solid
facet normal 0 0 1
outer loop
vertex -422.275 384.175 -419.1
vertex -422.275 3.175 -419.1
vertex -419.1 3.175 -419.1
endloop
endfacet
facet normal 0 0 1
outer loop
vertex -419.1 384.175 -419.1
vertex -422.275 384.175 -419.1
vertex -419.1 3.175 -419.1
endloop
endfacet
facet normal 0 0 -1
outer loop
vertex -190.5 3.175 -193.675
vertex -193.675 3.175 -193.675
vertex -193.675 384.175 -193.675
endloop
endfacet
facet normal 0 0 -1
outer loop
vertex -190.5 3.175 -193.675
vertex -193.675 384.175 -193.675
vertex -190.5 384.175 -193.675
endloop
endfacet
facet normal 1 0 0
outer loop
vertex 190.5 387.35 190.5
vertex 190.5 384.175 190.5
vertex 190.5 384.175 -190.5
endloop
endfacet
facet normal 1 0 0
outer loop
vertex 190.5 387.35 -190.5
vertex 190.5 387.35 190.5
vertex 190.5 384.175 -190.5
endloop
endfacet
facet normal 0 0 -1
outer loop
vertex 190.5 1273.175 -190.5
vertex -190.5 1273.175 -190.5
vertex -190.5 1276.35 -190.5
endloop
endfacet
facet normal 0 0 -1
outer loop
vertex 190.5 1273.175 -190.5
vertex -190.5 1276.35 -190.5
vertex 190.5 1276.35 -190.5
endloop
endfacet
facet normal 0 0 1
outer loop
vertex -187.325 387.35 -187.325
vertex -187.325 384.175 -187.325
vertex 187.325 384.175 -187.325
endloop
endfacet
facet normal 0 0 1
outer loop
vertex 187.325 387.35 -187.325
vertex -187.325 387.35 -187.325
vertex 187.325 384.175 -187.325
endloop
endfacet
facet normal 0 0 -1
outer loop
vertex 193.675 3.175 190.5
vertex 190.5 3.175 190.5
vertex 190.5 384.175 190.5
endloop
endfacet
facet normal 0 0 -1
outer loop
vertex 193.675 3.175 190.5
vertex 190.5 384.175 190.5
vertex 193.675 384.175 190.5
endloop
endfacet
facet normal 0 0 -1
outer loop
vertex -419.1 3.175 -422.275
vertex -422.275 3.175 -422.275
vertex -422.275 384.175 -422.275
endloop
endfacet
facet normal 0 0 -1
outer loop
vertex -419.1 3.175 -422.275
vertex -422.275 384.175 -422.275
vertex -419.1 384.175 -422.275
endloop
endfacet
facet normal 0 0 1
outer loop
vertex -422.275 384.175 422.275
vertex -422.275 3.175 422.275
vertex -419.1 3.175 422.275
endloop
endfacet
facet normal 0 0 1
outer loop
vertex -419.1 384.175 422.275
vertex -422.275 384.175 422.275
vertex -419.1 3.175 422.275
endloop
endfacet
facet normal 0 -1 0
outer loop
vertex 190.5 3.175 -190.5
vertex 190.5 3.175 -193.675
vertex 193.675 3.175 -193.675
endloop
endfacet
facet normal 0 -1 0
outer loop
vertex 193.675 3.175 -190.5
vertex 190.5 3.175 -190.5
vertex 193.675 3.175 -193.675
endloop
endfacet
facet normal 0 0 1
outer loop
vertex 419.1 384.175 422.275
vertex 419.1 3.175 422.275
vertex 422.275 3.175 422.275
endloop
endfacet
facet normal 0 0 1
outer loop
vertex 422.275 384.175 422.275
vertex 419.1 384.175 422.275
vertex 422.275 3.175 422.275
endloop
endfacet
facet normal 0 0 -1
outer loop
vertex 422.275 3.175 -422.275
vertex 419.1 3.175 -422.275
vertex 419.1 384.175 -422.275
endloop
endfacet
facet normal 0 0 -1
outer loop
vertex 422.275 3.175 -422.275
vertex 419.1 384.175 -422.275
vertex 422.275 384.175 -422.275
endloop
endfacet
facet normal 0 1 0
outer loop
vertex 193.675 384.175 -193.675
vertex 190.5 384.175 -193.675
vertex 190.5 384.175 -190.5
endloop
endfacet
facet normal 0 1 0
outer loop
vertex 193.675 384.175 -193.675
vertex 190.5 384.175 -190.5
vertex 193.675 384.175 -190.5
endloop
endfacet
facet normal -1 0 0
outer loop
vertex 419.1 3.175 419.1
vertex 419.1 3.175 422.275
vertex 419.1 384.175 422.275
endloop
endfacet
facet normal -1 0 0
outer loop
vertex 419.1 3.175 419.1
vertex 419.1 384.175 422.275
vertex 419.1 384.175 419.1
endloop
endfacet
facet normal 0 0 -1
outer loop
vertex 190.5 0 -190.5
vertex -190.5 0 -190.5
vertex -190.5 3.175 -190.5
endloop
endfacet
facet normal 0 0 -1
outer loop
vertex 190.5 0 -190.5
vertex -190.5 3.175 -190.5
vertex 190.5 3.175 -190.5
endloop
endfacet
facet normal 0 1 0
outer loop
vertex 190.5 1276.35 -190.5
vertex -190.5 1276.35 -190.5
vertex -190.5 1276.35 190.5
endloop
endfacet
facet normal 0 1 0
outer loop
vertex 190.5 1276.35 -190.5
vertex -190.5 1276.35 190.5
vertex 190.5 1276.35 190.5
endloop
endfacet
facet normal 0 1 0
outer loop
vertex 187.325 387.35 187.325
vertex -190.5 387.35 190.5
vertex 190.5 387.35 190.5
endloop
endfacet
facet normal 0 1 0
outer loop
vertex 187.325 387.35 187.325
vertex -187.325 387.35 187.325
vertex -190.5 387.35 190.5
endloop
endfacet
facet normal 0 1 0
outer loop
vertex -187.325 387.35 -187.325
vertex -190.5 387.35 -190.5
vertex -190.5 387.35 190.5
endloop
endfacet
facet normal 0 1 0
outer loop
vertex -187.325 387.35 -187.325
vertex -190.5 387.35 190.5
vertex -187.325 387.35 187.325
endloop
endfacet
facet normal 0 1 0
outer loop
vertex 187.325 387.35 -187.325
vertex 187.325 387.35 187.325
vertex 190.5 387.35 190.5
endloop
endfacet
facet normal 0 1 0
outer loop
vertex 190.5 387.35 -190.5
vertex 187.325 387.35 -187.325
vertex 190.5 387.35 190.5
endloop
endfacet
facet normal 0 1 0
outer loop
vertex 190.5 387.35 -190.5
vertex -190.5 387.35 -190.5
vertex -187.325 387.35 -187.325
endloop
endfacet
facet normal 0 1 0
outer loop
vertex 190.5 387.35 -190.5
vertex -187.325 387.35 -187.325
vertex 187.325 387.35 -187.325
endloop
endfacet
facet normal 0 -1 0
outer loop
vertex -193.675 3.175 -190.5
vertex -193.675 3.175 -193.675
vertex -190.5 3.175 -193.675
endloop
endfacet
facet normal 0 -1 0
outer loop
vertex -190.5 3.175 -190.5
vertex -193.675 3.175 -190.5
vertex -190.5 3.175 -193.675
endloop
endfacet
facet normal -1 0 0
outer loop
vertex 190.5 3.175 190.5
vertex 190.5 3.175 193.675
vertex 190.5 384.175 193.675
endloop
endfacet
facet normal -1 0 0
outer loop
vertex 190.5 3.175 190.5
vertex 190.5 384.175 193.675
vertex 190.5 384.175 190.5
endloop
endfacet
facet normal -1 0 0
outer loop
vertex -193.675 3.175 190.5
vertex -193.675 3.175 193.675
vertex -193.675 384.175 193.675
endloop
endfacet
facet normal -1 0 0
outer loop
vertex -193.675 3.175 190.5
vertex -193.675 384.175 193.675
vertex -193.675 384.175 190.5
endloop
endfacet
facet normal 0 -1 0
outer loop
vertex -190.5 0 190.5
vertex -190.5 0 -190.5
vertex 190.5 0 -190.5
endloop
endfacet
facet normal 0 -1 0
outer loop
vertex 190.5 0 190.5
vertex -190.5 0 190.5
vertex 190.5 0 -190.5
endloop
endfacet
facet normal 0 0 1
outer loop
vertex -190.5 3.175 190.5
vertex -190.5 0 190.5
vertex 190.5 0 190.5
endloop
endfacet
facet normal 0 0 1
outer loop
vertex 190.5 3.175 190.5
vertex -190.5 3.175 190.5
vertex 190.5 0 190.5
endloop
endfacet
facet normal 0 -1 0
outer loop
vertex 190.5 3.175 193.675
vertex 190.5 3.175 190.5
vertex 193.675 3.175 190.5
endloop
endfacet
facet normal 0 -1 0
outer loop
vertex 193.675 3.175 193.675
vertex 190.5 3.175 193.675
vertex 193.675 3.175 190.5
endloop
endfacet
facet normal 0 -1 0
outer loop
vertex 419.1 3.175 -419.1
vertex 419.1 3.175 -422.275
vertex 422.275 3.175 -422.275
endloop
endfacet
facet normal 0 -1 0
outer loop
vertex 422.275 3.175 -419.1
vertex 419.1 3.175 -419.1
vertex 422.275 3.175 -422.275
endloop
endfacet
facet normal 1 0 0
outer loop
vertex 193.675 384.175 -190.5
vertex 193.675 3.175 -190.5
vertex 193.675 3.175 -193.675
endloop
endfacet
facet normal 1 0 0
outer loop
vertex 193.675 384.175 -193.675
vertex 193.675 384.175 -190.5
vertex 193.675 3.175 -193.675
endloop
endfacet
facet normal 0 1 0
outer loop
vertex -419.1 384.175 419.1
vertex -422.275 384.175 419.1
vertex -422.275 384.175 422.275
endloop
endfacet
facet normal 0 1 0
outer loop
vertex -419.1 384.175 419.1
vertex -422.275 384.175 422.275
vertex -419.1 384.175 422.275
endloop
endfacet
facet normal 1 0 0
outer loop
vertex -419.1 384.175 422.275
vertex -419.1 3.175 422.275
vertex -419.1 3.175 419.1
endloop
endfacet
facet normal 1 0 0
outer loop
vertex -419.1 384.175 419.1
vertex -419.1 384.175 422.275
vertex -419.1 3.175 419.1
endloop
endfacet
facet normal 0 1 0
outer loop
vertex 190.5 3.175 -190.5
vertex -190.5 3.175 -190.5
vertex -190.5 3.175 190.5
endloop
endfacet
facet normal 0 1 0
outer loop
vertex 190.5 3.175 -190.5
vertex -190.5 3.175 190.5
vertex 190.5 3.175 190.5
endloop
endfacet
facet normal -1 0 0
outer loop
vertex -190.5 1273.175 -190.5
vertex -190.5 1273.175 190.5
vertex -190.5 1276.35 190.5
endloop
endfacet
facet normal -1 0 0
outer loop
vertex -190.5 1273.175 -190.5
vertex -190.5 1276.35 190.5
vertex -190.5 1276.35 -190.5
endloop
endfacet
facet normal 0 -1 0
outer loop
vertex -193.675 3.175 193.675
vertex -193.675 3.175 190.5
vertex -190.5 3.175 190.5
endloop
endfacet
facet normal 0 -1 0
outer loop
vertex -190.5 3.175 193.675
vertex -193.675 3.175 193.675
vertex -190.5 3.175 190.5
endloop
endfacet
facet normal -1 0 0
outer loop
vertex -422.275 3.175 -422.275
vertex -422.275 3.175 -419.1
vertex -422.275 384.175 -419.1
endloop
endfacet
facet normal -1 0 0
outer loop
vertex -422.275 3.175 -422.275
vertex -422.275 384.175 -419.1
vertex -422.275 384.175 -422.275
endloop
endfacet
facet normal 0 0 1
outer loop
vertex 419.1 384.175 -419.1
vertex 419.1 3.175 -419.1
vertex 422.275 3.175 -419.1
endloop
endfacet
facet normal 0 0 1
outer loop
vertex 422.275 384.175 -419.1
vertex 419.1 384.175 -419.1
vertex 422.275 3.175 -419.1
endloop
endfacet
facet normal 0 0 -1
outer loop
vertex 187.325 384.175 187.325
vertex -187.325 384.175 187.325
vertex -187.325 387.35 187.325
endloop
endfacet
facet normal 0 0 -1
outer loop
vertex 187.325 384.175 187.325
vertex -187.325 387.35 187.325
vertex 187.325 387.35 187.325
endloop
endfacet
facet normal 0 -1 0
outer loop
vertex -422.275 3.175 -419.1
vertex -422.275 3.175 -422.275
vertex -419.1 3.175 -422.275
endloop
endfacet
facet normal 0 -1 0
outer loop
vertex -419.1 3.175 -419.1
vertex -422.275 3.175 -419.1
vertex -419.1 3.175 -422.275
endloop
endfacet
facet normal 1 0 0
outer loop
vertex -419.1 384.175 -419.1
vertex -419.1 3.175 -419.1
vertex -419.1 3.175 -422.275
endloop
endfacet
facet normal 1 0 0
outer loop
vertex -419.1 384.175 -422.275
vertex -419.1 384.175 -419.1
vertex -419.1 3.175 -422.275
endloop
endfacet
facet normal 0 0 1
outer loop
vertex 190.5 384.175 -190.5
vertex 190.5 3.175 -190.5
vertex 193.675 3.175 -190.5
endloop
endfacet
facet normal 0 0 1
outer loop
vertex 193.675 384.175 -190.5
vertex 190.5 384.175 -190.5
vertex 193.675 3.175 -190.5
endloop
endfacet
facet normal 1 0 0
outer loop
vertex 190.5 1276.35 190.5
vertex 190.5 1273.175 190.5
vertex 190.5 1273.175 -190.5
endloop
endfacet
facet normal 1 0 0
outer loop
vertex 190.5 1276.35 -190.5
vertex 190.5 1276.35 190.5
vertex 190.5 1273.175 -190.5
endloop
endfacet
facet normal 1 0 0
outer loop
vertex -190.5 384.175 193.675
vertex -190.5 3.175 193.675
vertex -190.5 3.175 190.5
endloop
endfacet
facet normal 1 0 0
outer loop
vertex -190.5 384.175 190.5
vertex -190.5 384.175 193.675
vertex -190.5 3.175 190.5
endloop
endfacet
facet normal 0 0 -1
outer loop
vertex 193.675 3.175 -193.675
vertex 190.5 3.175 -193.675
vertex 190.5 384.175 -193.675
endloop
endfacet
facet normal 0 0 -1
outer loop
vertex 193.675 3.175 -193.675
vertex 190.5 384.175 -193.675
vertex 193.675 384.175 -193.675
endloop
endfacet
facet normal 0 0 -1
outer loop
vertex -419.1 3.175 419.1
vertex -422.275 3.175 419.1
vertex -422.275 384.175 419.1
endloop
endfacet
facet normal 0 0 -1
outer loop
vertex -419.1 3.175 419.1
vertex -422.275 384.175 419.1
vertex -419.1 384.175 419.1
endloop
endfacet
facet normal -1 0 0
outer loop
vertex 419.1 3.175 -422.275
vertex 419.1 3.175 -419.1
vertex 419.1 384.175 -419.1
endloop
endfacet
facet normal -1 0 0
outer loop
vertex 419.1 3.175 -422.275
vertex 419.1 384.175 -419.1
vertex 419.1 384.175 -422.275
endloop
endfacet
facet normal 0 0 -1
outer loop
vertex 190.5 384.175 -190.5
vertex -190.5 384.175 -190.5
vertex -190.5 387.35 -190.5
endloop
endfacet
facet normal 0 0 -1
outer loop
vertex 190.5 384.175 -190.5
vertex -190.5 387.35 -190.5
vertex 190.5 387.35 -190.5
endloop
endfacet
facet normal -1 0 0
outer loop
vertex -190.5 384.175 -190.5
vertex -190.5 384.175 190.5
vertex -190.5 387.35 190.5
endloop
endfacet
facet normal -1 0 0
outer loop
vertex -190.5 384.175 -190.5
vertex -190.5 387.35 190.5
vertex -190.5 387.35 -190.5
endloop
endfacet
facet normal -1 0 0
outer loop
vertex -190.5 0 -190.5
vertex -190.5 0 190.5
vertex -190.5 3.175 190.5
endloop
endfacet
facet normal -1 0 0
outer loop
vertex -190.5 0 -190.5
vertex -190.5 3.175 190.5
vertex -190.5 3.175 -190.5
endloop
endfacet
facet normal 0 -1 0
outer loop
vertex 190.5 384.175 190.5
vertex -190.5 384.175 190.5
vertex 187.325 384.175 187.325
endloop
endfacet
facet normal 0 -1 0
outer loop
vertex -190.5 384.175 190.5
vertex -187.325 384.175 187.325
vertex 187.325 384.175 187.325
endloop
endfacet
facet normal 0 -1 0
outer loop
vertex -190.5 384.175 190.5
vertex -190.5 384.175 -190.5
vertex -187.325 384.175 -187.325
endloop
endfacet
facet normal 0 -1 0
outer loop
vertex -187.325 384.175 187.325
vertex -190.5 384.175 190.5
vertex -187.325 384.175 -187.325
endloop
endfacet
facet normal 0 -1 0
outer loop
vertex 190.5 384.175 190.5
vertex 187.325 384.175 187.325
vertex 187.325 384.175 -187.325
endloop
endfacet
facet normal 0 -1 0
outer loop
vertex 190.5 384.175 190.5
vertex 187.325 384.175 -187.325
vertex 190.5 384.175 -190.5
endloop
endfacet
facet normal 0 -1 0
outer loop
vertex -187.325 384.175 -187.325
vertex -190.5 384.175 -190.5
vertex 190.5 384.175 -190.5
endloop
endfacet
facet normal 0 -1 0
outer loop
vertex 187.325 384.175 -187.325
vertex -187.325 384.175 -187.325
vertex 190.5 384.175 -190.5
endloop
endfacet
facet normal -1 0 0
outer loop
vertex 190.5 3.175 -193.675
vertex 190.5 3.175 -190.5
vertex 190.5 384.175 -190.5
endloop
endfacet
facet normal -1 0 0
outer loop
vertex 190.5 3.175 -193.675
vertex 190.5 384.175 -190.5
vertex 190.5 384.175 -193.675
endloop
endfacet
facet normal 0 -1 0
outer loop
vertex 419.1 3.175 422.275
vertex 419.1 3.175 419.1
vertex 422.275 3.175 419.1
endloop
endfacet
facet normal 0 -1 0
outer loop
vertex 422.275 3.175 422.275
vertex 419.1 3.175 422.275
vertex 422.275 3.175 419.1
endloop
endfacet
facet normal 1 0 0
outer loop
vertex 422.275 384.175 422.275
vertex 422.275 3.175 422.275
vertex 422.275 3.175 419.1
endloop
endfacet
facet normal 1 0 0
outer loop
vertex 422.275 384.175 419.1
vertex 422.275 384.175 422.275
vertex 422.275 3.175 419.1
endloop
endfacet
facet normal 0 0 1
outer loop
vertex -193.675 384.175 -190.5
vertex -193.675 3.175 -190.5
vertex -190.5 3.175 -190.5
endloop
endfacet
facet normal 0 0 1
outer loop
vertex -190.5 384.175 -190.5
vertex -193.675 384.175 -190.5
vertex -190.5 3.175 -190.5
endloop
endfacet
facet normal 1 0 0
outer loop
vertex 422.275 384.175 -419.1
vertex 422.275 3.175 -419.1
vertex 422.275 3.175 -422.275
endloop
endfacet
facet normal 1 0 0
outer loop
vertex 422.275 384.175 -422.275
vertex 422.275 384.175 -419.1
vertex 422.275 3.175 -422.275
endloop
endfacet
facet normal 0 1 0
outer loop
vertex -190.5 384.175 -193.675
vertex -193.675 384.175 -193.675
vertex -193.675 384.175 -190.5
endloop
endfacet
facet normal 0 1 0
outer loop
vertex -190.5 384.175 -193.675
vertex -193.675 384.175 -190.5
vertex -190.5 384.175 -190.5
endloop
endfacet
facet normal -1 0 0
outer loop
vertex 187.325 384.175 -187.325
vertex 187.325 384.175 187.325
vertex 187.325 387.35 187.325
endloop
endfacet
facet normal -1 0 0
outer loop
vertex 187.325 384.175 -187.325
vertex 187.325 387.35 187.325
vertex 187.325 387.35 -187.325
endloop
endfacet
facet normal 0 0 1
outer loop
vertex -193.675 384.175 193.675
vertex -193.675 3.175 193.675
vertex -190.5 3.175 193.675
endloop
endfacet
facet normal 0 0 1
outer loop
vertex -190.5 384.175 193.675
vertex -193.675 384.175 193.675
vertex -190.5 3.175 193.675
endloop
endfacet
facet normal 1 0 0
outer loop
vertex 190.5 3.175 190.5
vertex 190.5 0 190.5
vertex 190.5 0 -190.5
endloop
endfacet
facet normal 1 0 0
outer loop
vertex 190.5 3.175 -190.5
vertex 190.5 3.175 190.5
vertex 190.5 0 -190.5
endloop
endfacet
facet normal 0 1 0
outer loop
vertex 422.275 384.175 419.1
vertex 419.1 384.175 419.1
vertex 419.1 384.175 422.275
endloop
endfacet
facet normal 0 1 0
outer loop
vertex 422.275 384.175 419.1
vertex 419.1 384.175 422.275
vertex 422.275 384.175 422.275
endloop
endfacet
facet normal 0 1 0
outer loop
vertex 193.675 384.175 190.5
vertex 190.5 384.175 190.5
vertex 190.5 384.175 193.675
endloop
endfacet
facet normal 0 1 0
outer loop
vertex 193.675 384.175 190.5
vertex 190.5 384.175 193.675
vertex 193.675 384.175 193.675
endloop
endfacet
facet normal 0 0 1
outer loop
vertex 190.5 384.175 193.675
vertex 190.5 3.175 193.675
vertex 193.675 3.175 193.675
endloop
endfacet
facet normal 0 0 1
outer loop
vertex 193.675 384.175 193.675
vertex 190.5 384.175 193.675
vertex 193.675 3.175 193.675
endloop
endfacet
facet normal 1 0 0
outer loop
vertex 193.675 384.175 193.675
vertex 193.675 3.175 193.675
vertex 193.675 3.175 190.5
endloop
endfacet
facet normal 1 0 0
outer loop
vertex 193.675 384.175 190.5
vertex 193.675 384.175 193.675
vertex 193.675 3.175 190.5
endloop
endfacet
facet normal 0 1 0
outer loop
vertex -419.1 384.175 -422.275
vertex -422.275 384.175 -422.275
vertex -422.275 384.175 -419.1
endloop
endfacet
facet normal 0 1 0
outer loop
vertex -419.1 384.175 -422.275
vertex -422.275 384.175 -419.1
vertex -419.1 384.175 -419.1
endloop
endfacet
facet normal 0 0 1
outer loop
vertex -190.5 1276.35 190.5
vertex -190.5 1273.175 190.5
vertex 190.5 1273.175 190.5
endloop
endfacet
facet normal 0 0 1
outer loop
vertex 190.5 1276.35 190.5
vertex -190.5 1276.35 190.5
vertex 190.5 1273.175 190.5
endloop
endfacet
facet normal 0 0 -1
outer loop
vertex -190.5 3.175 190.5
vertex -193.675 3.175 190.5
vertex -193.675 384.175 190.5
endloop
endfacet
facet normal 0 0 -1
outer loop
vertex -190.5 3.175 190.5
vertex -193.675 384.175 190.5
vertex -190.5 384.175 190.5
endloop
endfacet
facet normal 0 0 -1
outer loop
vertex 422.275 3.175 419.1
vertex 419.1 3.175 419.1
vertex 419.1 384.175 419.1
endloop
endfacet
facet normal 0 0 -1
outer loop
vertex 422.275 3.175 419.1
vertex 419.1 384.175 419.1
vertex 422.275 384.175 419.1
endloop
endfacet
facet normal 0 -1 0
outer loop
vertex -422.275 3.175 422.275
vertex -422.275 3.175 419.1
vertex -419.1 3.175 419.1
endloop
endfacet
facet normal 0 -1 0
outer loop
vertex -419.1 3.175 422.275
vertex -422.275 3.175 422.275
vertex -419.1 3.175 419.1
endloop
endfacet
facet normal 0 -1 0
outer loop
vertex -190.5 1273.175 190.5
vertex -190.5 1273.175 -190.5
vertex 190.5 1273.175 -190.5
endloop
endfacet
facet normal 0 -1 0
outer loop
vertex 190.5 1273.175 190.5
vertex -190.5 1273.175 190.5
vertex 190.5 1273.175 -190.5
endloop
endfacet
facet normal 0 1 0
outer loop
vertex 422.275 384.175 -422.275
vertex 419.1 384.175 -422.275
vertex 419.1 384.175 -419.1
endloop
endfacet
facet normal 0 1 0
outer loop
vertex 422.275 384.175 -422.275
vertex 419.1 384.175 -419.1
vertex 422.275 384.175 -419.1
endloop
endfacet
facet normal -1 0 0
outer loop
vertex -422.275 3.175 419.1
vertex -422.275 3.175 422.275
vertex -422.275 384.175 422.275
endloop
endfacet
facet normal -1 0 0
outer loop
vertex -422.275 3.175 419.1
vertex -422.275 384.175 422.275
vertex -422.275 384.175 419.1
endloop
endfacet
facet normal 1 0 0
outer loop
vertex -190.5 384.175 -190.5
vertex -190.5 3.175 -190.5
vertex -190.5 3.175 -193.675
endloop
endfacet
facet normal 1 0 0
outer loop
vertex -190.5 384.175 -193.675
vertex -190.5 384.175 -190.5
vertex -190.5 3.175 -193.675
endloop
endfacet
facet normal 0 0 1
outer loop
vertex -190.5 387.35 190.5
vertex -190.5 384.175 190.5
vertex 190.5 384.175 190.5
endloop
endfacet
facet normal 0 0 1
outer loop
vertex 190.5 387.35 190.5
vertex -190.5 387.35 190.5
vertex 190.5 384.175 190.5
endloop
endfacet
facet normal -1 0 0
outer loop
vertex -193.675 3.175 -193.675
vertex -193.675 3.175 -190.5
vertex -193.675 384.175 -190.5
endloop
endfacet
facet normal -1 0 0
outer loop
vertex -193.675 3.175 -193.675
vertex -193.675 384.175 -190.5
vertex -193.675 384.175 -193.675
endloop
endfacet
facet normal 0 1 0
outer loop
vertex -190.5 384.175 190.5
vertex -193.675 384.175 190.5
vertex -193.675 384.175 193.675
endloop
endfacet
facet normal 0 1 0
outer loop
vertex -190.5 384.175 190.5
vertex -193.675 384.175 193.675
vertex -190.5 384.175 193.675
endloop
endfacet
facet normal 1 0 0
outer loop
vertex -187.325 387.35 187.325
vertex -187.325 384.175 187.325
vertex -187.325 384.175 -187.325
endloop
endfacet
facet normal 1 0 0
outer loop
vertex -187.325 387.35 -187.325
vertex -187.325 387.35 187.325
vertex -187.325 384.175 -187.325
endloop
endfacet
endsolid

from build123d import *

# Parameters (mm, degrees)
SKETCH1_W             = 381
SKETCH1_H             = 381
BOSS_EXTRUDE1_DEPTH   = 3.175
SKETCH3_W             = 3.175
SKETCH3_H             = 3.175
BOSS_EXTRUDE2_DEPTH   = 381
BOSS_EXTRUDE2_2_DEPTH = 381
BOSS_EXTRUDE2_3_DEPTH = 381
BOSS_EXTRUDE2_4_DEPTH = 381
SKETCH4_W             = 381
SKETCH4_H             = 381
SKETCH4_W_2           = 374.65
SKETCH4_H_2           = 374.65
BOSS_EXTRUDE3_DEPTH   = 3.175
SKETCH5_W             = 3.175
SKETCH5_H             = 3.175
BOSS_EXTRUDE4_DEPTH   = 381
BOSS_EXTRUDE4_2_DEPTH = 381
BOSS_EXTRUDE4_3_DEPTH = 381
BOSS_EXTRUDE4_4_DEPTH = 381
SKETCH6_W             = 381
SKETCH6_H             = 381
BOSS_EXTRUDE5_DEPTH   = 3.175


with BuildPart() as part:
    # Sketch1 → Boss-Extrude1 (new body)
    with BuildSketch(Plane(origin=(0, 0, 0), x_dir=(1, 0, 0), z_dir=(0, 1, 0))):
        Rectangle(SKETCH1_W, SKETCH1_H)
    extrude(amount=BOSS_EXTRUDE1_DEPTH)


with BuildPart() as body_2:
    # Sketch3 → Boss-Extrude2 (new body)
    with BuildSketch(Plane(origin=(0, 3.175, 0), x_dir=(1, 0, 0), z_dir=(0, 1, 0))):
        with Locations((192.0875, 192.0875)):
            Rectangle(SKETCH3_W, SKETCH3_H)
    extrude(amount=BOSS_EXTRUDE2_DEPTH)


with BuildPart() as body_3:
    # Sketch3 → Boss-Extrude2 2 (new body)
    with BuildSketch(Plane(origin=(0, 3.175, 0), x_dir=(1, 0, 0), z_dir=(0, 1, 0))):
        with Locations((192.0875, -192.0875)):
            Rectangle(SKETCH3_W, SKETCH3_H)
    extrude(amount=BOSS_EXTRUDE2_2_DEPTH)


with BuildPart() as body_4:
    # Sketch3 → Boss-Extrude2 3 (new body)
    with BuildSketch(Plane(origin=(0, 3.175, 0), x_dir=(1, 0, 0), z_dir=(0, 1, 0))):
        with Locations((-192.0875, -192.0875)):
            Rectangle(SKETCH3_W, SKETCH3_H)
    extrude(amount=BOSS_EXTRUDE2_3_DEPTH)


with BuildPart() as body_5:
    # Sketch3 → Boss-Extrude2 4 (new body)
    with BuildSketch(Plane(origin=(0, 3.175, 0), x_dir=(1, 0, 0), z_dir=(0, 1, 0))):
        with Locations((-192.0875, 192.0875)):
            Rectangle(SKETCH3_W, SKETCH3_H)
    extrude(amount=BOSS_EXTRUDE2_4_DEPTH)


with BuildPart() as body_6:
    # Sketch4 → Boss-Extrude3 (new body)
    with BuildSketch(Plane(origin=(0, 384.175, 0), x_dir=(1, 0, 0), z_dir=(0, 1, 0))):
        Rectangle(SKETCH4_W, SKETCH4_H)
        Rectangle(SKETCH4_W_2, SKETCH4_H_2, mode=Mode.SUBTRACT)
    extrude(amount=BOSS_EXTRUDE3_DEPTH)


with BuildPart() as body_7:
    # Sketch5 → Boss-Extrude4 (new body)
    with BuildSketch(Plane(origin=(0, 3.175, 0), x_dir=(1, 0, 0), z_dir=(0, 1, 0))):
        with Locations((-420.6875, -420.6875)):
            Rectangle(SKETCH5_W, SKETCH5_H)
    extrude(amount=BOSS_EXTRUDE4_DEPTH)


with BuildPart() as body_8:
    # Sketch5 → Boss-Extrude4 2 (new body)
    with BuildSketch(Plane(origin=(0, 3.175, 0), x_dir=(1, 0, 0), z_dir=(0, 1, 0))):
        with Locations((-420.6875, 420.6875)):
            Rectangle(SKETCH5_W, SKETCH5_H)
    extrude(amount=BOSS_EXTRUDE4_2_DEPTH)


with BuildPart() as body_9:
    # Sketch5 → Boss-Extrude4 3 (new body)
    with BuildSketch(Plane(origin=(0, 3.175, 0), x_dir=(1, 0, 0), z_dir=(0, 1, 0))):
        with Locations((420.6875, 420.6875)):
            Rectangle(SKETCH5_W, SKETCH5_H)
    extrude(amount=BOSS_EXTRUDE4_3_DEPTH)


with BuildPart() as body_10:
    # Sketch5 → Boss-Extrude4 4 (new body)
    with BuildSketch(Plane(origin=(0, 3.175, 0), x_dir=(1, 0, 0), z_dir=(0, 1, 0))):
        with Locations((420.6875, -420.6875)):
            Rectangle(SKETCH5_W, SKETCH5_H)
    extrude(amount=BOSS_EXTRUDE4_4_DEPTH)


with BuildPart() as body_11:
    # Sketch6 → Boss-Extrude5 (new body)
    with BuildSketch(Plane(origin=(0, 1273.175, 0), x_dir=(1, 0, 0), z_dir=(0, 1, 0))):
        Rectangle(SKETCH6_W, SKETCH6_H)
    extrude(amount=BOSS_EXTRUDE5_DEPTH)


solid = Compound([part.part, body_2.part, body_3.part, body_4.part, body_5.part, body_6.part, body_7.part, body_8.part, body_9.part, body_10.part, body_11.part])
